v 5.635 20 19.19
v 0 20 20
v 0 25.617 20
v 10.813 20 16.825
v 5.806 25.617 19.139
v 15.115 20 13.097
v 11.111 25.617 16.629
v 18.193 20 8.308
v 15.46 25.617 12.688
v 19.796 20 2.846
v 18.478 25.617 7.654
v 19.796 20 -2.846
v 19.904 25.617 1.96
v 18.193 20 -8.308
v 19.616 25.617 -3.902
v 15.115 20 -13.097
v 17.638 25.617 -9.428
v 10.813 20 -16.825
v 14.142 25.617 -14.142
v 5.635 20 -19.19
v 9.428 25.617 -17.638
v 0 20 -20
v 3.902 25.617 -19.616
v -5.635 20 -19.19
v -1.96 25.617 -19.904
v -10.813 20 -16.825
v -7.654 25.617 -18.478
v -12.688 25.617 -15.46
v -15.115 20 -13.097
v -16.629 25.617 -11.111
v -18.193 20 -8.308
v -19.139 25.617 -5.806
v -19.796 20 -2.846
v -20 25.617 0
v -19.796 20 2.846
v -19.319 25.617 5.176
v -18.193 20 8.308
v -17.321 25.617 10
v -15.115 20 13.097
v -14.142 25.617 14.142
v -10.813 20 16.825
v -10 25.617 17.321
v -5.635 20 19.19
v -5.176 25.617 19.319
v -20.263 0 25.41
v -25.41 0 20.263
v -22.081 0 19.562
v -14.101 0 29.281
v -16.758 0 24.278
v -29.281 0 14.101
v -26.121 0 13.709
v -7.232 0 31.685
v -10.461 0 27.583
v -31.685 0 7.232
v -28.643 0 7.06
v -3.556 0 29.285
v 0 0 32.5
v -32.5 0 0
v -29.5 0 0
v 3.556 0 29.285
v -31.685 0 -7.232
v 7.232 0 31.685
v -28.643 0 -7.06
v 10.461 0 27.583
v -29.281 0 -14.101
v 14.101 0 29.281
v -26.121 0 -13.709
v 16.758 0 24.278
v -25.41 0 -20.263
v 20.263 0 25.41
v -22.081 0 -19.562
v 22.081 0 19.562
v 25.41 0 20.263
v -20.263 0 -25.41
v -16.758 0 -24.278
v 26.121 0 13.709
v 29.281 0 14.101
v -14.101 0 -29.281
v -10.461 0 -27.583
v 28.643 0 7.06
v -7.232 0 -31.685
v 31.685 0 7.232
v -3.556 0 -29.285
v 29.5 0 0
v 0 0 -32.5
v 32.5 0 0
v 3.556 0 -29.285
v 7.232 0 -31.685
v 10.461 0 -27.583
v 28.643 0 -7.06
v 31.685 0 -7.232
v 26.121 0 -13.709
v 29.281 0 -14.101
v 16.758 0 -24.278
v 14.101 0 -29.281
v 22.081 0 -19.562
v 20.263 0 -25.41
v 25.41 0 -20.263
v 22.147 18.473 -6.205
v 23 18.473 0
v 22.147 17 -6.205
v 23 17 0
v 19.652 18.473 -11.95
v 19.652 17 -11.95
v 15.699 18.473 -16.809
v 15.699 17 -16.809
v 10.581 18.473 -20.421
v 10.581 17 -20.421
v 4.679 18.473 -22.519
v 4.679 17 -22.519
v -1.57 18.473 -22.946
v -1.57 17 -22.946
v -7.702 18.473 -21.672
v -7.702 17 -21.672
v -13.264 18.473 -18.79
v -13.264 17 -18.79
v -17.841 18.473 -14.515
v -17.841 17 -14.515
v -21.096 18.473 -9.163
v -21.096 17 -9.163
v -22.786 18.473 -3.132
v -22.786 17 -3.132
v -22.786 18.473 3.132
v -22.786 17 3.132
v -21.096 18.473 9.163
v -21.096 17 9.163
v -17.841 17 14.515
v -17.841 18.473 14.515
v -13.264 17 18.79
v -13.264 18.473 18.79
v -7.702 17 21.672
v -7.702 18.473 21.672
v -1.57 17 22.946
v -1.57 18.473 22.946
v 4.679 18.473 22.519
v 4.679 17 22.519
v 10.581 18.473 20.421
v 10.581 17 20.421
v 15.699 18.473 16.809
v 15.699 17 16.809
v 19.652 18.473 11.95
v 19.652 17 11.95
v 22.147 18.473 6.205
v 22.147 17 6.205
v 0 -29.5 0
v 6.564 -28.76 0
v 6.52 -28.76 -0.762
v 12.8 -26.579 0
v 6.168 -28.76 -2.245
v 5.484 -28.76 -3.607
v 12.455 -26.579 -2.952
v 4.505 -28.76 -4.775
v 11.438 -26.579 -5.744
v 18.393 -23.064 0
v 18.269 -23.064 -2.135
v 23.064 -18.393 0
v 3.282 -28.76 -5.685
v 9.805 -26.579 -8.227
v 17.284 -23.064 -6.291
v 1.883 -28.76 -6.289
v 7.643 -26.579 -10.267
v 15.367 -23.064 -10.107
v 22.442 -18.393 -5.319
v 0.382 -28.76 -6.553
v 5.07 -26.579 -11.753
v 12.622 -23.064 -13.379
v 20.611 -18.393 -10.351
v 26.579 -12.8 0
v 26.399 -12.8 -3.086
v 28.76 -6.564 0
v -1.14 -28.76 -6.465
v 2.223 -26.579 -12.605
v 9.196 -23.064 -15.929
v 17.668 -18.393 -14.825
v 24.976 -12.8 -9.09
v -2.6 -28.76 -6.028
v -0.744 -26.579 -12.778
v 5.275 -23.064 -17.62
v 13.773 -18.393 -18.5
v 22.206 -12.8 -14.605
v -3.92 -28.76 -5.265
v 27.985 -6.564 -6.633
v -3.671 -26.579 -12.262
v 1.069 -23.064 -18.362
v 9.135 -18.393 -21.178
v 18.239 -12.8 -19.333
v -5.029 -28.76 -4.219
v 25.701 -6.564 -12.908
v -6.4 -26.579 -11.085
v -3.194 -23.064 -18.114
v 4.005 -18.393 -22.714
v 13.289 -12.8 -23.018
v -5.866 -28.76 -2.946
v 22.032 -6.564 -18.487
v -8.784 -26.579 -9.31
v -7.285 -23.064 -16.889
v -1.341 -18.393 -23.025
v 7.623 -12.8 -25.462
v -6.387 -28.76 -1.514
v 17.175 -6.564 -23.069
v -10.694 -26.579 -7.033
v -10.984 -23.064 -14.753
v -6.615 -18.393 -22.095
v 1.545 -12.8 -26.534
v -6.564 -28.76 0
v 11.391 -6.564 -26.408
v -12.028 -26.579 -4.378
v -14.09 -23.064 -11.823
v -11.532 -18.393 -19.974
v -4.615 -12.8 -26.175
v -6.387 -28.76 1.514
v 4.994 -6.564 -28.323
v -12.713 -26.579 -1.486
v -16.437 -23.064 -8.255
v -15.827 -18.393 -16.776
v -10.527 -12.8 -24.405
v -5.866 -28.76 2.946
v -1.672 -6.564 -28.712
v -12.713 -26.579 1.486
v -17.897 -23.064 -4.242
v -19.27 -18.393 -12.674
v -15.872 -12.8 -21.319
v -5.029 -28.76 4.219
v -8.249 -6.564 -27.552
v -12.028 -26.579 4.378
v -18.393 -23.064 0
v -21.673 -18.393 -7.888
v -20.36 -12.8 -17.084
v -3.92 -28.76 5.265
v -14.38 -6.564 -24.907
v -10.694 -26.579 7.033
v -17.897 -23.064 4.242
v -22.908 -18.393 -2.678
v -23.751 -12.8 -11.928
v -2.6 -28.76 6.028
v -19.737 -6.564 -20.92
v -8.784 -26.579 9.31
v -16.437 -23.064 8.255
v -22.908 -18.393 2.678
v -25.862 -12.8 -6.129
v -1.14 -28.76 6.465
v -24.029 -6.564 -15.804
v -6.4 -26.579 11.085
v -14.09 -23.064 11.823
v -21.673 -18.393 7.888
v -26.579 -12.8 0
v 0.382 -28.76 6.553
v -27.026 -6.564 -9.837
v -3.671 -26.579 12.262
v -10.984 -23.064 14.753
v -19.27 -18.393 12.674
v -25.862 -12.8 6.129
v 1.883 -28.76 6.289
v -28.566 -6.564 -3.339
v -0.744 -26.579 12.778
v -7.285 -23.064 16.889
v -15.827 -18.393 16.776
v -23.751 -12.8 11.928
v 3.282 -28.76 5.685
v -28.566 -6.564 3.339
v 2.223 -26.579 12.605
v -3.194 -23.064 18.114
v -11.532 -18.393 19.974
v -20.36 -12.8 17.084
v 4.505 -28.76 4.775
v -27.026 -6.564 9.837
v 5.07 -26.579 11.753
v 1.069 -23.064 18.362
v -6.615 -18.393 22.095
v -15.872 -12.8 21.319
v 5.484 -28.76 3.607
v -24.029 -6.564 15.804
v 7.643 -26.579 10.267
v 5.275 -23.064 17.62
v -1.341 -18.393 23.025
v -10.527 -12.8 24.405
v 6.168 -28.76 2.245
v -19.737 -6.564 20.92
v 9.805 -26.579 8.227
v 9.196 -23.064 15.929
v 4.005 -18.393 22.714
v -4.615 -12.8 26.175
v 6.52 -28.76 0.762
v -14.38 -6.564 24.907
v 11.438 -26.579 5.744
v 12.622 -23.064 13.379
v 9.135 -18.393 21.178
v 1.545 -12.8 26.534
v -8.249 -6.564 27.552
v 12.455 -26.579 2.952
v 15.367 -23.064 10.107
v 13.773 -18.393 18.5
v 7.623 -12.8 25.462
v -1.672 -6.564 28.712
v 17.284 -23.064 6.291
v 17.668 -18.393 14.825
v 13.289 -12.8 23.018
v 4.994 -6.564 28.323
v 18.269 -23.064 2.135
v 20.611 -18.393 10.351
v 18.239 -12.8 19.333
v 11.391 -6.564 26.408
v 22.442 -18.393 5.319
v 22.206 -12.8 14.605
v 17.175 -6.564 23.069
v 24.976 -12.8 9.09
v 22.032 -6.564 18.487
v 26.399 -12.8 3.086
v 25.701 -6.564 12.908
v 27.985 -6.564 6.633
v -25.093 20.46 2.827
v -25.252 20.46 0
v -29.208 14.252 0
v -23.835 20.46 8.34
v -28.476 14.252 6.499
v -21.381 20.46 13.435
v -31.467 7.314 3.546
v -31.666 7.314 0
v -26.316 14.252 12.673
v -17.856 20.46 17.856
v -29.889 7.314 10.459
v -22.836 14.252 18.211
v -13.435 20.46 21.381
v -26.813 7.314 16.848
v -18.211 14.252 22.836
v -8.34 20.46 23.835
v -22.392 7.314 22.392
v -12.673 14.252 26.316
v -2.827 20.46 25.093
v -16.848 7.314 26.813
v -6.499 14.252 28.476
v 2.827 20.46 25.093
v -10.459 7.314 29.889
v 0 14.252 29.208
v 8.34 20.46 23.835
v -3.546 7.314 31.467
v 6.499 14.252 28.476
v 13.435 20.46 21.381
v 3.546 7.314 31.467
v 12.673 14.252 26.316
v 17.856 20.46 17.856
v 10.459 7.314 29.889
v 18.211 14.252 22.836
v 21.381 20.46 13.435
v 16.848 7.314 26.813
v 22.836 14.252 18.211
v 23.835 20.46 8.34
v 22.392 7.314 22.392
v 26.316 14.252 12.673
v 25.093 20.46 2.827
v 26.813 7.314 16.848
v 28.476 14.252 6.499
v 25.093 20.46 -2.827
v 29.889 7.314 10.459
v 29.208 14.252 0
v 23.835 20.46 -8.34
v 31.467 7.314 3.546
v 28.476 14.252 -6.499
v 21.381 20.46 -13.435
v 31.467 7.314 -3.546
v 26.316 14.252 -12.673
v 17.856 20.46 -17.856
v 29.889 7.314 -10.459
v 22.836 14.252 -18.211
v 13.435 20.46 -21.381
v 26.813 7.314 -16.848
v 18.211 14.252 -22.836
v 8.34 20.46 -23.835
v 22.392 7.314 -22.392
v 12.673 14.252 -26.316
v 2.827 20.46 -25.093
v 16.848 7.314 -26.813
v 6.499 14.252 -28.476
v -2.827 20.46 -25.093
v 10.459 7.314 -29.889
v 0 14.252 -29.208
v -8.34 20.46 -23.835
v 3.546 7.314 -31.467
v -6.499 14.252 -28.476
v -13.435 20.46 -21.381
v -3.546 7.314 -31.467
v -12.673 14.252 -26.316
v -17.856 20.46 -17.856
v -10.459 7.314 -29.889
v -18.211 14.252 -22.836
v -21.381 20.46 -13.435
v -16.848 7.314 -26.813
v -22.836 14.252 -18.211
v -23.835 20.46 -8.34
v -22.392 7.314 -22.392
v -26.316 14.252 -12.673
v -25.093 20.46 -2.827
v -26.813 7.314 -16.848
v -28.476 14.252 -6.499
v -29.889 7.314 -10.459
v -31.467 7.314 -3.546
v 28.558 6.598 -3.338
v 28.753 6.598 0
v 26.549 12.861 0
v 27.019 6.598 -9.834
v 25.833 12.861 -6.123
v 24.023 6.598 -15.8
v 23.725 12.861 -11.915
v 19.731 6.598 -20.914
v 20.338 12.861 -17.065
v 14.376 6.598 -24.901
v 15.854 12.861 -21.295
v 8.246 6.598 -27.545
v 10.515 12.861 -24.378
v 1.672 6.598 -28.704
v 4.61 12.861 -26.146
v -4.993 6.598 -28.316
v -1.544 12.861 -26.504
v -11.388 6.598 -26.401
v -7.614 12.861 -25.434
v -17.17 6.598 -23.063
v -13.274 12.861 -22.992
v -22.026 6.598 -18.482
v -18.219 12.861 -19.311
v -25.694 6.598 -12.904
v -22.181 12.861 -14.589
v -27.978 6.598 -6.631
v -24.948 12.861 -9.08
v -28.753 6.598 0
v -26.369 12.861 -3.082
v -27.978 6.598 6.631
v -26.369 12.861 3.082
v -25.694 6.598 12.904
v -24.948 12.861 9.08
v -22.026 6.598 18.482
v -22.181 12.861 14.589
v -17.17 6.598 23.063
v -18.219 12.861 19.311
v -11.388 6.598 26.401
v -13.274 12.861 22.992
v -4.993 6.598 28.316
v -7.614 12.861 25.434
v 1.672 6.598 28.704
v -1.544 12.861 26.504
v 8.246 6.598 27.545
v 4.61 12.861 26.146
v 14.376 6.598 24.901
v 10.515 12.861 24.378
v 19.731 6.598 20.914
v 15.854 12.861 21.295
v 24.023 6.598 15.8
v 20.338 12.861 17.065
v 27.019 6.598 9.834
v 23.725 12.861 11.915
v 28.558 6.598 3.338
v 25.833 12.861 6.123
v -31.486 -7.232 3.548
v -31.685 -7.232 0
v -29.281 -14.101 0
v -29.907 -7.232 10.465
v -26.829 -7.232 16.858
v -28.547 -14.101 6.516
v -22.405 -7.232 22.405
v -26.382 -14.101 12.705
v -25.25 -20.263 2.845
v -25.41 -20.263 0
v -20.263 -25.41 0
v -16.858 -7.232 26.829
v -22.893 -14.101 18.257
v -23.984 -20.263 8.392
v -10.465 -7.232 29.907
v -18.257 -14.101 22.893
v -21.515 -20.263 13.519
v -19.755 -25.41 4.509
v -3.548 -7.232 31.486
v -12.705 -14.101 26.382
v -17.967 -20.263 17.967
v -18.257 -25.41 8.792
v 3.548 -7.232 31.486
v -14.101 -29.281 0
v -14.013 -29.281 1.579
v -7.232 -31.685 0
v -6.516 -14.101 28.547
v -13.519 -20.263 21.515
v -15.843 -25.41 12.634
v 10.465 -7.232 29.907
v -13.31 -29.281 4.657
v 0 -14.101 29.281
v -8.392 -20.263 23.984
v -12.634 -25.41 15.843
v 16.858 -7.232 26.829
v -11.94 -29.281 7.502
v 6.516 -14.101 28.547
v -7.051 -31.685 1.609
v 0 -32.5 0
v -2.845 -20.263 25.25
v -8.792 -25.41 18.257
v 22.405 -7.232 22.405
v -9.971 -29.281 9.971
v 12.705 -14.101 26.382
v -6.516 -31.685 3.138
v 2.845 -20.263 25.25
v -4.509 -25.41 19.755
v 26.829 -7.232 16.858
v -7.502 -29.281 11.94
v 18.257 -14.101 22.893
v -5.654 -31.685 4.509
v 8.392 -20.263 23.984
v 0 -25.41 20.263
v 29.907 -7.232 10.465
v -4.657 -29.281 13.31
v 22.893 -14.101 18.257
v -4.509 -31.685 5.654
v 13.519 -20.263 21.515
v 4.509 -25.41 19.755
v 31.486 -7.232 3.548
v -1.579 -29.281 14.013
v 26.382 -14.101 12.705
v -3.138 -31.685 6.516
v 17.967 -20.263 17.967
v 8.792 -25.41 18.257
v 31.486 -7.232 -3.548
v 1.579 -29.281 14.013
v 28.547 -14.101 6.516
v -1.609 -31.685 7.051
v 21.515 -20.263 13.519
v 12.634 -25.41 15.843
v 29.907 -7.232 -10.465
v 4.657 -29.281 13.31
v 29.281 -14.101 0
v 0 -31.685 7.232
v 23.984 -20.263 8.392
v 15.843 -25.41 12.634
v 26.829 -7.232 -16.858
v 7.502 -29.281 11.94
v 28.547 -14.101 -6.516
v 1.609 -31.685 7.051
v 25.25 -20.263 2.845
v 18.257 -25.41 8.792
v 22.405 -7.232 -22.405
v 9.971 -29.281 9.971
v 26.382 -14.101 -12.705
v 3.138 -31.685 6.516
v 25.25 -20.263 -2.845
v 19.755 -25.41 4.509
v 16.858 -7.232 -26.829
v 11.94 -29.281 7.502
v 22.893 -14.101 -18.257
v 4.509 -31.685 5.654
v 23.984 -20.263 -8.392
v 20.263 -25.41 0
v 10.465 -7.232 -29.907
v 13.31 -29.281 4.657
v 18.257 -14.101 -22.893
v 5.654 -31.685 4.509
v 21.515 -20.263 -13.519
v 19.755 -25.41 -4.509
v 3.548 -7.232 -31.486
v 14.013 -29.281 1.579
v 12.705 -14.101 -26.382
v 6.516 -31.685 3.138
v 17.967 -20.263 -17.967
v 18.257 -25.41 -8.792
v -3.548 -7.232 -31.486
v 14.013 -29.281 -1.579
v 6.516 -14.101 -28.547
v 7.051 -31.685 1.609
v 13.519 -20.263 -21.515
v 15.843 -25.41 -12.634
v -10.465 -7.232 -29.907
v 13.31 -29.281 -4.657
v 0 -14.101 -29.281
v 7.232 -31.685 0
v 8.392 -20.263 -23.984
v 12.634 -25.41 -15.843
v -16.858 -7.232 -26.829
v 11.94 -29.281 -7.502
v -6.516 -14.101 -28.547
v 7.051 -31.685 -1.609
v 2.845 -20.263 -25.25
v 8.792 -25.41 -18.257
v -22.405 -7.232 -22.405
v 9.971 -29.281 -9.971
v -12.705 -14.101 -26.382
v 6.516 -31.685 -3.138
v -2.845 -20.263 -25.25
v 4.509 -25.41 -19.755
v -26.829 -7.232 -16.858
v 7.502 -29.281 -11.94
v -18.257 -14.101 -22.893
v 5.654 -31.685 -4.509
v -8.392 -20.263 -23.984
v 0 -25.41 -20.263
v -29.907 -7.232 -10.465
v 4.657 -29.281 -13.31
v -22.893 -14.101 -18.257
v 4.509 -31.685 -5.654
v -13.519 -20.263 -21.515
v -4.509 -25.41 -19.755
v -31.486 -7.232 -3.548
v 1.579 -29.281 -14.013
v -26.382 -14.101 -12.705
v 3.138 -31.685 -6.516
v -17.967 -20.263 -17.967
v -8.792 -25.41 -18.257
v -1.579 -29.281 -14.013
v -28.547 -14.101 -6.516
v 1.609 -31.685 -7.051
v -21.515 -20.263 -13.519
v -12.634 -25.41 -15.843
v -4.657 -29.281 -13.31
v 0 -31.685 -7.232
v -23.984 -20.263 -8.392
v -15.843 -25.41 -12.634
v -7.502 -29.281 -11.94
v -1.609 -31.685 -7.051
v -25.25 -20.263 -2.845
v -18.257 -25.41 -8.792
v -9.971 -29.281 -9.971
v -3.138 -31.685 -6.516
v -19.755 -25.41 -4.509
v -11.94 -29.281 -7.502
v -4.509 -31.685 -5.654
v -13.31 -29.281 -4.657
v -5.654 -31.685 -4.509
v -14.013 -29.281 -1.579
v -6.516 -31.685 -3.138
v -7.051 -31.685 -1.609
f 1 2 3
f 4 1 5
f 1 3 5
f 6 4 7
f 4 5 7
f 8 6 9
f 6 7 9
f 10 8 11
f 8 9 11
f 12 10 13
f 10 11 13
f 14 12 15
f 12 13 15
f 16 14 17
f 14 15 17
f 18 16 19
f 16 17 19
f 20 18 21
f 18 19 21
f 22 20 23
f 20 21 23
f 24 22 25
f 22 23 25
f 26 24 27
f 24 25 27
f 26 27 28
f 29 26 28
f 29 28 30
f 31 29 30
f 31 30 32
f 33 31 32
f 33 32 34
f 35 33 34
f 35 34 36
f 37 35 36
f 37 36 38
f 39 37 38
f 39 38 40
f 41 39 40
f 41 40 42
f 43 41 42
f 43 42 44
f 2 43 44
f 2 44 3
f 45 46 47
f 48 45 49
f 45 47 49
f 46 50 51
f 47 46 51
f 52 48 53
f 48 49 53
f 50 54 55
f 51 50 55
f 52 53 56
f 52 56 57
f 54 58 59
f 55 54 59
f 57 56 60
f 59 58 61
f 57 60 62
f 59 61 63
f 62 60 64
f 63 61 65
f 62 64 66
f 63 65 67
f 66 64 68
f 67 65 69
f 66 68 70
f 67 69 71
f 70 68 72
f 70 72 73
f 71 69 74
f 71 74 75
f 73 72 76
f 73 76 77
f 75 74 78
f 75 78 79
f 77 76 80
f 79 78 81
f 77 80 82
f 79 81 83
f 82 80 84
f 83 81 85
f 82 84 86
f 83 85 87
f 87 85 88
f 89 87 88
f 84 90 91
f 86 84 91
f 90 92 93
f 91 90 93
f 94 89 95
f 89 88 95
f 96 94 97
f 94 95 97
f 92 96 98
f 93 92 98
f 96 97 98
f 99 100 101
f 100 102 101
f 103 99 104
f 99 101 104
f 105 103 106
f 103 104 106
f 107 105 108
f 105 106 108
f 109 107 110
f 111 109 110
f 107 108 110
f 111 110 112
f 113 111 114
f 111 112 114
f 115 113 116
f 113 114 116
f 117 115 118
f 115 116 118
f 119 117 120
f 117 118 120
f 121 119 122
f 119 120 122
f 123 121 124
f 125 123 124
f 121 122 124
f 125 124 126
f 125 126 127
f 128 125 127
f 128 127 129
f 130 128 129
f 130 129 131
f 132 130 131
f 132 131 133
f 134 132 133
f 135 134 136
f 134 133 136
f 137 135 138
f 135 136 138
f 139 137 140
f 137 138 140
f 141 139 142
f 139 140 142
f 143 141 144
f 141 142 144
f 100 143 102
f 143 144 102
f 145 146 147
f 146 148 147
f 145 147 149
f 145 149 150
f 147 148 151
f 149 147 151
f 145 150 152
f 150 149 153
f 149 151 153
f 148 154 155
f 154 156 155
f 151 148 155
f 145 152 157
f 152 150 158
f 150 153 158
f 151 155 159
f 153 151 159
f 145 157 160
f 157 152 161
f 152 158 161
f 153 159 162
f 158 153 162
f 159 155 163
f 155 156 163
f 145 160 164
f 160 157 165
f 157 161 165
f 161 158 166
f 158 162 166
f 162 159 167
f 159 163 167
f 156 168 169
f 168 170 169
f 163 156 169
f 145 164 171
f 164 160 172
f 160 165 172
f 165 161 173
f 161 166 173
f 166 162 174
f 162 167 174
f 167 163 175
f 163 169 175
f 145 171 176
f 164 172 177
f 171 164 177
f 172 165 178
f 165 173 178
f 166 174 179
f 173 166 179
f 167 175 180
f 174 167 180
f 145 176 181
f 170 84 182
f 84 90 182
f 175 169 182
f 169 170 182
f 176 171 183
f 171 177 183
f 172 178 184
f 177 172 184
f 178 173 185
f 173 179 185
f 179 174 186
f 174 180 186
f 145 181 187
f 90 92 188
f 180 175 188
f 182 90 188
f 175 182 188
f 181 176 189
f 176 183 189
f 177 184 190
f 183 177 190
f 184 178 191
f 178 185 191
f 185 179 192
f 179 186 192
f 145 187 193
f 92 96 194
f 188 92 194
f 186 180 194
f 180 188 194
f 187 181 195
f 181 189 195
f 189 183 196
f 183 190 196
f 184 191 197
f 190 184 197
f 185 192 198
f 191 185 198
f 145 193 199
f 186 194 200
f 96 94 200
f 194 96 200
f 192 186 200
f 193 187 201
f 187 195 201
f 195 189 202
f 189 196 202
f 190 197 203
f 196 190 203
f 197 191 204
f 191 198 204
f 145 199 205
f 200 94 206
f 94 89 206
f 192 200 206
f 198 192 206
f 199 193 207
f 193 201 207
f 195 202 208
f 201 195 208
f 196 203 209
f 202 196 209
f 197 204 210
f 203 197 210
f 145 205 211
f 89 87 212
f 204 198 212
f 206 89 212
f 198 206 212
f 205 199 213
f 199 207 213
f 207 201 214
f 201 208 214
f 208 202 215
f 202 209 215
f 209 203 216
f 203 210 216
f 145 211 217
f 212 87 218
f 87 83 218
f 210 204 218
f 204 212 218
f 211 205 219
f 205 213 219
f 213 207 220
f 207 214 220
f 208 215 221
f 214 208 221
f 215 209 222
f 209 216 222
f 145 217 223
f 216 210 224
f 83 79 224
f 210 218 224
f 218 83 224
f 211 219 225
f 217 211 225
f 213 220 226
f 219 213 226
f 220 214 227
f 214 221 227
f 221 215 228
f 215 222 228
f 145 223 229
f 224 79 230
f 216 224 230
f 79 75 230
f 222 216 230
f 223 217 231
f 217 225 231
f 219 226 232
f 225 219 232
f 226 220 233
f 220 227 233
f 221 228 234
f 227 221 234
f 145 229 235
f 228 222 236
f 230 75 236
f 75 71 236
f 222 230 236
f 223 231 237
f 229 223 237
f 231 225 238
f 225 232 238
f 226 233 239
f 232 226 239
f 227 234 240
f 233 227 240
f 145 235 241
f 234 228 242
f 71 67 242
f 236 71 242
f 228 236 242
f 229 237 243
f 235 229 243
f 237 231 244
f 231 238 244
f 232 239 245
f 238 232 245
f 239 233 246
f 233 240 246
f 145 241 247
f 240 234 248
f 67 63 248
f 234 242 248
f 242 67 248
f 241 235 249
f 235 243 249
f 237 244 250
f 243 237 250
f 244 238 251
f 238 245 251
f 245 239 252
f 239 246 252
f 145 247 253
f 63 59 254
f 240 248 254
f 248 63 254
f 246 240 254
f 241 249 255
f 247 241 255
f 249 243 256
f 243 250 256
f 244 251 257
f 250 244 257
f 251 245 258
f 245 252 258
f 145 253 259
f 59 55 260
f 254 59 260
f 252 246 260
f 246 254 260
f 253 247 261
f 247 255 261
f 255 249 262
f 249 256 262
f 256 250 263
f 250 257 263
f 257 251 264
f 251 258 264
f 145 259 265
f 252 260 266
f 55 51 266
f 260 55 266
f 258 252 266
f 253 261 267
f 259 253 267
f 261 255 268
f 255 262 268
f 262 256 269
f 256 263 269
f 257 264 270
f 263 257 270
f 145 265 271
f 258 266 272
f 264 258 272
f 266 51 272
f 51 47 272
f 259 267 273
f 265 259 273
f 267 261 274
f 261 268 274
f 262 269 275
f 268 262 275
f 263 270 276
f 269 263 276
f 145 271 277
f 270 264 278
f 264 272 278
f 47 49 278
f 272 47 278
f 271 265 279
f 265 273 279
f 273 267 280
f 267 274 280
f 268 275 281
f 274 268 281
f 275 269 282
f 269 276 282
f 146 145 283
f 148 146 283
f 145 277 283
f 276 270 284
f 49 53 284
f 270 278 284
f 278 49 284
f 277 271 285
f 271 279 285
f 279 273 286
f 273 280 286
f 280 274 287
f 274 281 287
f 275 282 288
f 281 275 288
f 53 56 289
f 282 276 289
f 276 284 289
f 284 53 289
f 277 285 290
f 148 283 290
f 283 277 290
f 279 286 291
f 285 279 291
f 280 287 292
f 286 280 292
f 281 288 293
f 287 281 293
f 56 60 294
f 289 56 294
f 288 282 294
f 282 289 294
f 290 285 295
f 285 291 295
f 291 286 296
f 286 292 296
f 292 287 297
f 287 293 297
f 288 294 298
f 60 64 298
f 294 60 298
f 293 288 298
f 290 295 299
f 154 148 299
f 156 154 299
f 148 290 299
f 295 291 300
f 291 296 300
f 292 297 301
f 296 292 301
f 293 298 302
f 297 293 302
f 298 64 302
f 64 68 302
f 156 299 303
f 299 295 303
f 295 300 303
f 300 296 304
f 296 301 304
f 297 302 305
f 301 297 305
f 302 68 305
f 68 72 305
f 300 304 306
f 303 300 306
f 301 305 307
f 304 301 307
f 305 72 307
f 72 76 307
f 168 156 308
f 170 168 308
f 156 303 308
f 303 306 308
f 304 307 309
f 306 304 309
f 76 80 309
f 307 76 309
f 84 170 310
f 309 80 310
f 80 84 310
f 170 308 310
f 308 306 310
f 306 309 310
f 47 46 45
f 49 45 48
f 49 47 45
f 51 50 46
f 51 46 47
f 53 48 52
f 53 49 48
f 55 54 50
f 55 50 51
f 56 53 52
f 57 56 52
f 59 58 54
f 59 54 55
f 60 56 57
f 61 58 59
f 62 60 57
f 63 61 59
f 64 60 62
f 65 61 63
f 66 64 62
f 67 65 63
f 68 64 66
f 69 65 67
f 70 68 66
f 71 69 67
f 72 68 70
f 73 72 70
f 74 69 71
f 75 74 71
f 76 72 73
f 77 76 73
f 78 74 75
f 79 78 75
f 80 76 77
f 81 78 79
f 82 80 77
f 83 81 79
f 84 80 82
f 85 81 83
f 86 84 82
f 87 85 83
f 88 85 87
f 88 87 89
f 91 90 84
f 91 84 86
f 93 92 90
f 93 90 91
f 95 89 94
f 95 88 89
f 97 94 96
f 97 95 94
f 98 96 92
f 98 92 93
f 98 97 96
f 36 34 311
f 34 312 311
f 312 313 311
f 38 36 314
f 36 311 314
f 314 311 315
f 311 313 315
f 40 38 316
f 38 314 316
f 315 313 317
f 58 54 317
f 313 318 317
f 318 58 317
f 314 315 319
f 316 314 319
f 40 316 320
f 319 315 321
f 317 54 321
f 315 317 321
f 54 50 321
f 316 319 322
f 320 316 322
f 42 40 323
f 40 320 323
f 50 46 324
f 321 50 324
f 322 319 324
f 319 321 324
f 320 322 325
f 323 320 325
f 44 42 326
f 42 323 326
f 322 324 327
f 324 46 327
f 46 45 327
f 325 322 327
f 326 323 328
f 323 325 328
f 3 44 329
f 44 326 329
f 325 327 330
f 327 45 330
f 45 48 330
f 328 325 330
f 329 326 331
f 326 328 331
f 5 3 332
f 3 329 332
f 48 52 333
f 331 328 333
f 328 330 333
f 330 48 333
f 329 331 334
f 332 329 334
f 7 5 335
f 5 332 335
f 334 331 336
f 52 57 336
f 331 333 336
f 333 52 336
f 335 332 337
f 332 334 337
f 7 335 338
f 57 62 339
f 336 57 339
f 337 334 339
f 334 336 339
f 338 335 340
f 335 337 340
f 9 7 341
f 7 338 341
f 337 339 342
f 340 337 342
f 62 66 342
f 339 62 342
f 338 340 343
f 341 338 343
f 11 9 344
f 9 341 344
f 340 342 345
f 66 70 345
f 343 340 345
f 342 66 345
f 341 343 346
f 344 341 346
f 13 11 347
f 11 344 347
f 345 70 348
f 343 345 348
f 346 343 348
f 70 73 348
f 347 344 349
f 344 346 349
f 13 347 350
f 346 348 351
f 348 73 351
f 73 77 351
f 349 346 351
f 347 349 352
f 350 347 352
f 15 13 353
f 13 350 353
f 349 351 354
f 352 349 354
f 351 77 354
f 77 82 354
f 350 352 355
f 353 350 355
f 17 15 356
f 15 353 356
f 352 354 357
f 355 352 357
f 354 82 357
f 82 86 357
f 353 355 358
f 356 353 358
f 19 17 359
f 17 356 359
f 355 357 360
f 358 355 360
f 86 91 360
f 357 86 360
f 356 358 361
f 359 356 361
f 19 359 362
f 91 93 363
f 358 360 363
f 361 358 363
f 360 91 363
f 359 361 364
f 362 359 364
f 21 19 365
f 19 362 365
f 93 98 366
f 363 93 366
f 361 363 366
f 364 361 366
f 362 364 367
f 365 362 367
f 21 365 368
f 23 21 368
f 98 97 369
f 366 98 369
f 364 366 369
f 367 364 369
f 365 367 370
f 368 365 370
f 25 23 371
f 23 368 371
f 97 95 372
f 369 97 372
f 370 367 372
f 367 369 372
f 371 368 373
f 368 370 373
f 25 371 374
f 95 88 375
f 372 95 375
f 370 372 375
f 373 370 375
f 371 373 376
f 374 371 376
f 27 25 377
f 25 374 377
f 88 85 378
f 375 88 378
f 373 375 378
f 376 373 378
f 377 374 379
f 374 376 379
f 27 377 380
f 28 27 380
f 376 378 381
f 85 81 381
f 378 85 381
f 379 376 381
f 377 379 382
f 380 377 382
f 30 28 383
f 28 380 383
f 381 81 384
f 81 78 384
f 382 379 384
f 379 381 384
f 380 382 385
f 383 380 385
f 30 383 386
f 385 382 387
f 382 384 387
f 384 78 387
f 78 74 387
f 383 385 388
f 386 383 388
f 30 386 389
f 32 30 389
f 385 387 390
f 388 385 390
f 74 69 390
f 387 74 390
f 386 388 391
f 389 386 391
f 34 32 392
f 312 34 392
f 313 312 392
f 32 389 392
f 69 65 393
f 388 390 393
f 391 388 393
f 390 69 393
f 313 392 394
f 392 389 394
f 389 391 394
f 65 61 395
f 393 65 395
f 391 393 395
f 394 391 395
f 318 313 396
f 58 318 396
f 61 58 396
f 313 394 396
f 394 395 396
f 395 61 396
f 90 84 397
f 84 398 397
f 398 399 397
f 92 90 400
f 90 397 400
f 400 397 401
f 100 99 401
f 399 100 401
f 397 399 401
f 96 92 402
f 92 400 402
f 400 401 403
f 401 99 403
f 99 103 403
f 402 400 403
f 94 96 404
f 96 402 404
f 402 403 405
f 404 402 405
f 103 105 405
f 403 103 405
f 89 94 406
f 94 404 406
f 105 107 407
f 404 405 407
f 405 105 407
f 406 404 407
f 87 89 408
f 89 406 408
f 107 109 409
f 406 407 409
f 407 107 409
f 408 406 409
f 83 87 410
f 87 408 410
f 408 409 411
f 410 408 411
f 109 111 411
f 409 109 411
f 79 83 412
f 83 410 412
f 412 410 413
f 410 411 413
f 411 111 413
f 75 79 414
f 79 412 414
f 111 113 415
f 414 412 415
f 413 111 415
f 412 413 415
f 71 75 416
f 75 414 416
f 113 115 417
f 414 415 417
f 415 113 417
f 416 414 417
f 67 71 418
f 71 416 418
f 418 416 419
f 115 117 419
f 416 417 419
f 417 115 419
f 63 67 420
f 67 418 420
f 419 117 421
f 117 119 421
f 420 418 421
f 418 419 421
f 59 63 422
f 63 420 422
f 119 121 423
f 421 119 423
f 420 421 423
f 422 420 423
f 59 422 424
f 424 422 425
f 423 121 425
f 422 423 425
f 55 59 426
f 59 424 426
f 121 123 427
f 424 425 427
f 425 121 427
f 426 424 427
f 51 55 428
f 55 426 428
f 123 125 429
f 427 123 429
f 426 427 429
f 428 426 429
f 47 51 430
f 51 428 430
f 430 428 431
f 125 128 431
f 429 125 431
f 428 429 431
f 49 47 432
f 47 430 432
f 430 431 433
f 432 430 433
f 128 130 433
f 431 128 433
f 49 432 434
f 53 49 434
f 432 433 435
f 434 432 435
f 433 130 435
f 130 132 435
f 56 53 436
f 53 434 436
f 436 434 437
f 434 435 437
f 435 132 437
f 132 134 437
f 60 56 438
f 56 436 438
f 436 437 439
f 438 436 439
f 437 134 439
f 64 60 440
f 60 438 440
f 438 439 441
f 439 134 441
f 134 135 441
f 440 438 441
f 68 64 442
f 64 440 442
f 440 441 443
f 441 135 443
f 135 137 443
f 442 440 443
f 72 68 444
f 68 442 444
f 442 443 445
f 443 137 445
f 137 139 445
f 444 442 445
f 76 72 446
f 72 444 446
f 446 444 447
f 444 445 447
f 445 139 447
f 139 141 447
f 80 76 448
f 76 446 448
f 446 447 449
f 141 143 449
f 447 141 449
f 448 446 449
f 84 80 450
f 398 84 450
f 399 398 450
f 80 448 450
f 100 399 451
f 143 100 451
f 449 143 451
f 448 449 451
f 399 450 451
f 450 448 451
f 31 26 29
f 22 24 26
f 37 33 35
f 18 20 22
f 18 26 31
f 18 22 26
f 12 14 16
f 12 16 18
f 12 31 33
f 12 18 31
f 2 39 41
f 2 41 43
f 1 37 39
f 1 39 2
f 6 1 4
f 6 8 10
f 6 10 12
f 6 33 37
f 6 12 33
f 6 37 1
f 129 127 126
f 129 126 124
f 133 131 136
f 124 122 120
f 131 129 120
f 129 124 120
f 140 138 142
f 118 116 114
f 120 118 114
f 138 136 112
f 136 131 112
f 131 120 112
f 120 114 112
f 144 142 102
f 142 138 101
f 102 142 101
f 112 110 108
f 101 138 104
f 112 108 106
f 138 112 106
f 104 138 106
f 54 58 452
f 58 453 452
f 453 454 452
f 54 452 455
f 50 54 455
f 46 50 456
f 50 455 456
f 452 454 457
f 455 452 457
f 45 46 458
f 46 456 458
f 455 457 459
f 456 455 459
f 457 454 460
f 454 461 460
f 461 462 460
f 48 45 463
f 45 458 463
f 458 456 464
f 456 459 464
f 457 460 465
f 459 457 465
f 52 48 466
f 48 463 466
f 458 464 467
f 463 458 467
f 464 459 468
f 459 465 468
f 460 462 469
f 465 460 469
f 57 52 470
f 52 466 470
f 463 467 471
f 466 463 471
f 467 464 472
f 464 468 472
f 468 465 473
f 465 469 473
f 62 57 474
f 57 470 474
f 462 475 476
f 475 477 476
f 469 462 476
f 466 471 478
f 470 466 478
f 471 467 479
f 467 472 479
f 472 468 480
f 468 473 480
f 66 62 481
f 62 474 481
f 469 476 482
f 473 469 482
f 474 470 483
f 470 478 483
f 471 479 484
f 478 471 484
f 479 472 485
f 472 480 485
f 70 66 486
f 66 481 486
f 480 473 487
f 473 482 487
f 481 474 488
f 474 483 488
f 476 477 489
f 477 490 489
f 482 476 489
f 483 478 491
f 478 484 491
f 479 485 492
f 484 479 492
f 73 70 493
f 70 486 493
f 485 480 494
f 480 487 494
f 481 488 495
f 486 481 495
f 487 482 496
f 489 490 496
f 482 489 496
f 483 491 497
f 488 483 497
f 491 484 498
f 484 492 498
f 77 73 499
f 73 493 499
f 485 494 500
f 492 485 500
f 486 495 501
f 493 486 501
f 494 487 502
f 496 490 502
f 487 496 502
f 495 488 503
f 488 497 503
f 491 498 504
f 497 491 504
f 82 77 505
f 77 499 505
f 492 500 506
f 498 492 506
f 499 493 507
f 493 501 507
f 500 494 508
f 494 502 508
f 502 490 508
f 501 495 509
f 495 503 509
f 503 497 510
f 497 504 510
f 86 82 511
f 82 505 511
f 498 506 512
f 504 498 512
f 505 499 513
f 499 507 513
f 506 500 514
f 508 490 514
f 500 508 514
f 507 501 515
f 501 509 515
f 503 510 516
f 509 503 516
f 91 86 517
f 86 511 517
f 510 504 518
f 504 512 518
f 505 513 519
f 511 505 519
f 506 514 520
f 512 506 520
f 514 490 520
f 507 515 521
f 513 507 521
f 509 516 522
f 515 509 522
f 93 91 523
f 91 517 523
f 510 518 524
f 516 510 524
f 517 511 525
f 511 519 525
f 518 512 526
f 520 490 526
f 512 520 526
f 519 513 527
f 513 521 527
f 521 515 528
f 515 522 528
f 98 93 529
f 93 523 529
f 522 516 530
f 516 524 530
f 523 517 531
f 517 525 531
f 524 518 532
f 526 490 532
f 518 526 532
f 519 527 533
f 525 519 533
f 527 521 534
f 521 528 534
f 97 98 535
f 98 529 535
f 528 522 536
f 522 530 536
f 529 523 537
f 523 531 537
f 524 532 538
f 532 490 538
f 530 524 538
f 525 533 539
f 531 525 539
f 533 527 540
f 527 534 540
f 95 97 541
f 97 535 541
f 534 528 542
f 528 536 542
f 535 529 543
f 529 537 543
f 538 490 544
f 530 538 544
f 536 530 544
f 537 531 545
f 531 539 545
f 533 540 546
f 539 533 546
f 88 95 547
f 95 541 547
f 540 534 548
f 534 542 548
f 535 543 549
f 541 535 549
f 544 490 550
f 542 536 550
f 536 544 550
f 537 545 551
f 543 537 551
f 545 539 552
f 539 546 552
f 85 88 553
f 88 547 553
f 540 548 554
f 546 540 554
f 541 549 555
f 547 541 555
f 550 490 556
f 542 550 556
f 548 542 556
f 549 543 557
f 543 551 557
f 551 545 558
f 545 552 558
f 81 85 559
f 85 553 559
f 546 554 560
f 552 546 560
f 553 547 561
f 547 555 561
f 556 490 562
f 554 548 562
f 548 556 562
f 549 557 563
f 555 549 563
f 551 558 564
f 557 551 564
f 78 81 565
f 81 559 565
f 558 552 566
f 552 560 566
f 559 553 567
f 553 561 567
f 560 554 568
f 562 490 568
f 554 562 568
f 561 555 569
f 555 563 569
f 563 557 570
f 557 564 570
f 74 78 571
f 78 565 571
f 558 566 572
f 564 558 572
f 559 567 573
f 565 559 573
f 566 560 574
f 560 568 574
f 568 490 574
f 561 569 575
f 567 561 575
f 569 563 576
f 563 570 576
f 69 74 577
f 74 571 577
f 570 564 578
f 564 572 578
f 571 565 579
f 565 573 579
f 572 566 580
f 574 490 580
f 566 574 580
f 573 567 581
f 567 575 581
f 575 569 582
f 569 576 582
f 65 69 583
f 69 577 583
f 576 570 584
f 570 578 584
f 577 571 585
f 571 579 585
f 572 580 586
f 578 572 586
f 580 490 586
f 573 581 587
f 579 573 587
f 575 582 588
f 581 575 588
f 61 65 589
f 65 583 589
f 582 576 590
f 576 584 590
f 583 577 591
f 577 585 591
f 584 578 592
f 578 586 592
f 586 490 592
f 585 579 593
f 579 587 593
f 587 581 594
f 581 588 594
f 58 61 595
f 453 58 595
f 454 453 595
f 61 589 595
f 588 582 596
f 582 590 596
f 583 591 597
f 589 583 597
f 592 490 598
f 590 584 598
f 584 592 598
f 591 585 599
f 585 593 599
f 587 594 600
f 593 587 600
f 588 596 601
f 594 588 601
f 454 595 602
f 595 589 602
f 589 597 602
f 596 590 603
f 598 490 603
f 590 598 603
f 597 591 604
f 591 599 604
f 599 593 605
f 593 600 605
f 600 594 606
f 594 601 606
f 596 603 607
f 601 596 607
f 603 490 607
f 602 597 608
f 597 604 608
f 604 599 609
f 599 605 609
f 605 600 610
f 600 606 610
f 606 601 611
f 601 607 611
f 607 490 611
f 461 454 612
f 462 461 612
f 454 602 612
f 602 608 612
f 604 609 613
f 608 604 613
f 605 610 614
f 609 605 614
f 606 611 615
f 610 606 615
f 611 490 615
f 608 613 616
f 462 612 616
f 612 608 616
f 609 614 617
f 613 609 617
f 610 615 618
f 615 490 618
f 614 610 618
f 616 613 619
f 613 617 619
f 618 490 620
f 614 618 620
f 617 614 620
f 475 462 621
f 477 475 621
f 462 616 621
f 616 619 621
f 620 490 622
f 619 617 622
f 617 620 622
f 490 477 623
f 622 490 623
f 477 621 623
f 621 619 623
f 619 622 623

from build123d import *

# Parameters (mm, degrees)
SKETCH5_R              = 20
BUTTON_CUT_DEPTH       = 12.5
SPLIT1_SURFACE_1_BACK  = 109.755
SPLIT1_SURFACE_1_DEPTH = 219.51
SPLIT1_SURFACE_2_BACK  = 109.755
SPLIT1_SURFACE_2_DEPTH = 219.51


# Read off the part's stored shape, not the designer's step: Shell1
with BuildPart() as part:
    # Sketch1 → Sphere (revolve)
    with BuildSketch(Plane.XY):
        with BuildLine():
            Line((0, -32.5), (0, 32.5))
            ThreePointArc((0, 32.5), (-32.5, 0), (0, -32.5))
        make_face()
    revolve(axis=Axis((0, -32.5, 0), (0, 1, 0)))

    # Sketch5 → Button Cut (cut)
    with BuildSketch(Plane(origin=(0, 32.5, 0), x_dir=(1, 0, 0), z_dir=(0, 1, 0))):
        with Locations(Location((0, 0, 0), (0, 0, 270))):
            Circle(SKETCH5_R)
    extrude(amount=-BUTTON_CUT_DEPTH, mode=Mode.SUBTRACT)

    # Shell1 outline → Shell1 (revolve, cut)
    with BuildSketch(Plane.XY):
        with BuildLine():
            Line((0, 17), (0, -29.5))
            ThreePointArc((0, -29.5), (26.600771792, -12.753389358), (22.999999991, 18.472953214))
            Line((22.999999991, 18.472953214), (23, 17))
            Line((23, 17), (0, 17))
        make_face()
    revolve(axis=Axis((0, 0, 0), (0, 1, 0)), mode=Mode.SUBTRACT)


with BuildPart() as body_2:
    # Split1: the piece behind the surface
    add(part.part)
    # Split1 surface: a surface, the sketch's curves swept straight by 219.51 mm
    with BuildLine(Plane.XY.offset(-SPLIT1_SURFACE_1_BACK), mode=Mode.PRIVATE) as split1_surface_1_path:
        Line((-37.5, 0), (37.5, 0))
    split1_surface_1 = Shell.extrude(split1_surface_1_path.wire(), (0 * SPLIT1_SURFACE_1_DEPTH, 0 * SPLIT1_SURFACE_1_DEPTH, 1 * SPLIT1_SURFACE_1_DEPTH))
    split(bisect_by=split1_surface_1, keep=Keep.BOTTOM)


with BuildPart() as part_1:
    add(part.part)

    # Split1: split by a surface, the side it looks to stays
    # Split1 surface: a surface, the sketch's curves swept straight by 219.51 mm
    with BuildLine(Plane.XY.offset(-SPLIT1_SURFACE_2_BACK), mode=Mode.PRIVATE) as split1_surface_2_path:
        Line((-37.5, 0), (37.5, 0))
    split1_surface_2 = Shell.extrude(split1_surface_2_path.wire(), (0 * SPLIT1_SURFACE_2_DEPTH, 0 * SPLIT1_SURFACE_2_DEPTH, 1 * SPLIT1_SURFACE_2_DEPTH))
    split(bisect_by=split1_surface_2, keep=Keep.TOP)


solid = Compound([body_2.part, part_1.part])
